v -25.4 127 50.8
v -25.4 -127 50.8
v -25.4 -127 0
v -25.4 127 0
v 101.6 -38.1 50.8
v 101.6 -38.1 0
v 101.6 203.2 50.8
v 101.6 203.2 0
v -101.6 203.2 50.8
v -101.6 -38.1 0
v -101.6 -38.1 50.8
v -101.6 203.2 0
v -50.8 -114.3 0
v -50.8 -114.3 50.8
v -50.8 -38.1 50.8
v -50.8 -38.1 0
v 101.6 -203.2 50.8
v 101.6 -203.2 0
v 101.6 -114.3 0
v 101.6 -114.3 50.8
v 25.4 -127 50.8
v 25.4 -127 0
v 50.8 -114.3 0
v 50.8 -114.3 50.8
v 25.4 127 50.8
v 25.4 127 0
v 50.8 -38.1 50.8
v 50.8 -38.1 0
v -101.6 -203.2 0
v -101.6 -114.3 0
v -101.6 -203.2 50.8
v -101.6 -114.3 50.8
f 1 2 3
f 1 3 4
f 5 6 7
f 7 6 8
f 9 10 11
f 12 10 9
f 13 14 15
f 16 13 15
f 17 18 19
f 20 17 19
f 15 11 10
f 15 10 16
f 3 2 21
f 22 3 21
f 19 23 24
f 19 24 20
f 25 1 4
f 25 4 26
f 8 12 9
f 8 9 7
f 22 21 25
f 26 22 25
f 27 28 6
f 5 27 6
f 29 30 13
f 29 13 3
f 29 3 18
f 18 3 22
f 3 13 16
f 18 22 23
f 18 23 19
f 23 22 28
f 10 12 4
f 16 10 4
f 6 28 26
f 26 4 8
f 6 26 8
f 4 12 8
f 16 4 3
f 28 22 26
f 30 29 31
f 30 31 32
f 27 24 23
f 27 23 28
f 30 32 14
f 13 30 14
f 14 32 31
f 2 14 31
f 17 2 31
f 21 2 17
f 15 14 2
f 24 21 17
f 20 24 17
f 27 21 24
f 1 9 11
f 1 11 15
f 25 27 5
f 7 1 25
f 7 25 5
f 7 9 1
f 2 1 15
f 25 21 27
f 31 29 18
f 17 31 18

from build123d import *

# Parameters (mm, degrees)
F0_W     = 203.2
F0_H     = 406.4
F1_DEPTH = 50.8
F2_W     = 50.8
F2_H     = 254
F2_H_2   = 76.2
F3_DEPTH = 50.801


with BuildPart() as f1:
    # F0 (on Top) → F1 (new body)
    with BuildSketch(Plane.XY):
        Rectangle(F0_W, F0_H)
    extrude(amount=F1_DEPTH)

    # F2 (on face) → F3 (cut, through all)
    with BuildSketch(Plane.XY.offset(50.8)):
        Rectangle(F2_W, F2_H)
        with Locations((-76.2, -76.2)):
            Rectangle(F2_W, F2_H_2)
        with Locations((76.2, -76.2)):
            Rectangle(F2_W, F2_H_2)
    extrude(amount=-F3_DEPTH, mode=Mode.SUBTRACT)


solid = f1.part
